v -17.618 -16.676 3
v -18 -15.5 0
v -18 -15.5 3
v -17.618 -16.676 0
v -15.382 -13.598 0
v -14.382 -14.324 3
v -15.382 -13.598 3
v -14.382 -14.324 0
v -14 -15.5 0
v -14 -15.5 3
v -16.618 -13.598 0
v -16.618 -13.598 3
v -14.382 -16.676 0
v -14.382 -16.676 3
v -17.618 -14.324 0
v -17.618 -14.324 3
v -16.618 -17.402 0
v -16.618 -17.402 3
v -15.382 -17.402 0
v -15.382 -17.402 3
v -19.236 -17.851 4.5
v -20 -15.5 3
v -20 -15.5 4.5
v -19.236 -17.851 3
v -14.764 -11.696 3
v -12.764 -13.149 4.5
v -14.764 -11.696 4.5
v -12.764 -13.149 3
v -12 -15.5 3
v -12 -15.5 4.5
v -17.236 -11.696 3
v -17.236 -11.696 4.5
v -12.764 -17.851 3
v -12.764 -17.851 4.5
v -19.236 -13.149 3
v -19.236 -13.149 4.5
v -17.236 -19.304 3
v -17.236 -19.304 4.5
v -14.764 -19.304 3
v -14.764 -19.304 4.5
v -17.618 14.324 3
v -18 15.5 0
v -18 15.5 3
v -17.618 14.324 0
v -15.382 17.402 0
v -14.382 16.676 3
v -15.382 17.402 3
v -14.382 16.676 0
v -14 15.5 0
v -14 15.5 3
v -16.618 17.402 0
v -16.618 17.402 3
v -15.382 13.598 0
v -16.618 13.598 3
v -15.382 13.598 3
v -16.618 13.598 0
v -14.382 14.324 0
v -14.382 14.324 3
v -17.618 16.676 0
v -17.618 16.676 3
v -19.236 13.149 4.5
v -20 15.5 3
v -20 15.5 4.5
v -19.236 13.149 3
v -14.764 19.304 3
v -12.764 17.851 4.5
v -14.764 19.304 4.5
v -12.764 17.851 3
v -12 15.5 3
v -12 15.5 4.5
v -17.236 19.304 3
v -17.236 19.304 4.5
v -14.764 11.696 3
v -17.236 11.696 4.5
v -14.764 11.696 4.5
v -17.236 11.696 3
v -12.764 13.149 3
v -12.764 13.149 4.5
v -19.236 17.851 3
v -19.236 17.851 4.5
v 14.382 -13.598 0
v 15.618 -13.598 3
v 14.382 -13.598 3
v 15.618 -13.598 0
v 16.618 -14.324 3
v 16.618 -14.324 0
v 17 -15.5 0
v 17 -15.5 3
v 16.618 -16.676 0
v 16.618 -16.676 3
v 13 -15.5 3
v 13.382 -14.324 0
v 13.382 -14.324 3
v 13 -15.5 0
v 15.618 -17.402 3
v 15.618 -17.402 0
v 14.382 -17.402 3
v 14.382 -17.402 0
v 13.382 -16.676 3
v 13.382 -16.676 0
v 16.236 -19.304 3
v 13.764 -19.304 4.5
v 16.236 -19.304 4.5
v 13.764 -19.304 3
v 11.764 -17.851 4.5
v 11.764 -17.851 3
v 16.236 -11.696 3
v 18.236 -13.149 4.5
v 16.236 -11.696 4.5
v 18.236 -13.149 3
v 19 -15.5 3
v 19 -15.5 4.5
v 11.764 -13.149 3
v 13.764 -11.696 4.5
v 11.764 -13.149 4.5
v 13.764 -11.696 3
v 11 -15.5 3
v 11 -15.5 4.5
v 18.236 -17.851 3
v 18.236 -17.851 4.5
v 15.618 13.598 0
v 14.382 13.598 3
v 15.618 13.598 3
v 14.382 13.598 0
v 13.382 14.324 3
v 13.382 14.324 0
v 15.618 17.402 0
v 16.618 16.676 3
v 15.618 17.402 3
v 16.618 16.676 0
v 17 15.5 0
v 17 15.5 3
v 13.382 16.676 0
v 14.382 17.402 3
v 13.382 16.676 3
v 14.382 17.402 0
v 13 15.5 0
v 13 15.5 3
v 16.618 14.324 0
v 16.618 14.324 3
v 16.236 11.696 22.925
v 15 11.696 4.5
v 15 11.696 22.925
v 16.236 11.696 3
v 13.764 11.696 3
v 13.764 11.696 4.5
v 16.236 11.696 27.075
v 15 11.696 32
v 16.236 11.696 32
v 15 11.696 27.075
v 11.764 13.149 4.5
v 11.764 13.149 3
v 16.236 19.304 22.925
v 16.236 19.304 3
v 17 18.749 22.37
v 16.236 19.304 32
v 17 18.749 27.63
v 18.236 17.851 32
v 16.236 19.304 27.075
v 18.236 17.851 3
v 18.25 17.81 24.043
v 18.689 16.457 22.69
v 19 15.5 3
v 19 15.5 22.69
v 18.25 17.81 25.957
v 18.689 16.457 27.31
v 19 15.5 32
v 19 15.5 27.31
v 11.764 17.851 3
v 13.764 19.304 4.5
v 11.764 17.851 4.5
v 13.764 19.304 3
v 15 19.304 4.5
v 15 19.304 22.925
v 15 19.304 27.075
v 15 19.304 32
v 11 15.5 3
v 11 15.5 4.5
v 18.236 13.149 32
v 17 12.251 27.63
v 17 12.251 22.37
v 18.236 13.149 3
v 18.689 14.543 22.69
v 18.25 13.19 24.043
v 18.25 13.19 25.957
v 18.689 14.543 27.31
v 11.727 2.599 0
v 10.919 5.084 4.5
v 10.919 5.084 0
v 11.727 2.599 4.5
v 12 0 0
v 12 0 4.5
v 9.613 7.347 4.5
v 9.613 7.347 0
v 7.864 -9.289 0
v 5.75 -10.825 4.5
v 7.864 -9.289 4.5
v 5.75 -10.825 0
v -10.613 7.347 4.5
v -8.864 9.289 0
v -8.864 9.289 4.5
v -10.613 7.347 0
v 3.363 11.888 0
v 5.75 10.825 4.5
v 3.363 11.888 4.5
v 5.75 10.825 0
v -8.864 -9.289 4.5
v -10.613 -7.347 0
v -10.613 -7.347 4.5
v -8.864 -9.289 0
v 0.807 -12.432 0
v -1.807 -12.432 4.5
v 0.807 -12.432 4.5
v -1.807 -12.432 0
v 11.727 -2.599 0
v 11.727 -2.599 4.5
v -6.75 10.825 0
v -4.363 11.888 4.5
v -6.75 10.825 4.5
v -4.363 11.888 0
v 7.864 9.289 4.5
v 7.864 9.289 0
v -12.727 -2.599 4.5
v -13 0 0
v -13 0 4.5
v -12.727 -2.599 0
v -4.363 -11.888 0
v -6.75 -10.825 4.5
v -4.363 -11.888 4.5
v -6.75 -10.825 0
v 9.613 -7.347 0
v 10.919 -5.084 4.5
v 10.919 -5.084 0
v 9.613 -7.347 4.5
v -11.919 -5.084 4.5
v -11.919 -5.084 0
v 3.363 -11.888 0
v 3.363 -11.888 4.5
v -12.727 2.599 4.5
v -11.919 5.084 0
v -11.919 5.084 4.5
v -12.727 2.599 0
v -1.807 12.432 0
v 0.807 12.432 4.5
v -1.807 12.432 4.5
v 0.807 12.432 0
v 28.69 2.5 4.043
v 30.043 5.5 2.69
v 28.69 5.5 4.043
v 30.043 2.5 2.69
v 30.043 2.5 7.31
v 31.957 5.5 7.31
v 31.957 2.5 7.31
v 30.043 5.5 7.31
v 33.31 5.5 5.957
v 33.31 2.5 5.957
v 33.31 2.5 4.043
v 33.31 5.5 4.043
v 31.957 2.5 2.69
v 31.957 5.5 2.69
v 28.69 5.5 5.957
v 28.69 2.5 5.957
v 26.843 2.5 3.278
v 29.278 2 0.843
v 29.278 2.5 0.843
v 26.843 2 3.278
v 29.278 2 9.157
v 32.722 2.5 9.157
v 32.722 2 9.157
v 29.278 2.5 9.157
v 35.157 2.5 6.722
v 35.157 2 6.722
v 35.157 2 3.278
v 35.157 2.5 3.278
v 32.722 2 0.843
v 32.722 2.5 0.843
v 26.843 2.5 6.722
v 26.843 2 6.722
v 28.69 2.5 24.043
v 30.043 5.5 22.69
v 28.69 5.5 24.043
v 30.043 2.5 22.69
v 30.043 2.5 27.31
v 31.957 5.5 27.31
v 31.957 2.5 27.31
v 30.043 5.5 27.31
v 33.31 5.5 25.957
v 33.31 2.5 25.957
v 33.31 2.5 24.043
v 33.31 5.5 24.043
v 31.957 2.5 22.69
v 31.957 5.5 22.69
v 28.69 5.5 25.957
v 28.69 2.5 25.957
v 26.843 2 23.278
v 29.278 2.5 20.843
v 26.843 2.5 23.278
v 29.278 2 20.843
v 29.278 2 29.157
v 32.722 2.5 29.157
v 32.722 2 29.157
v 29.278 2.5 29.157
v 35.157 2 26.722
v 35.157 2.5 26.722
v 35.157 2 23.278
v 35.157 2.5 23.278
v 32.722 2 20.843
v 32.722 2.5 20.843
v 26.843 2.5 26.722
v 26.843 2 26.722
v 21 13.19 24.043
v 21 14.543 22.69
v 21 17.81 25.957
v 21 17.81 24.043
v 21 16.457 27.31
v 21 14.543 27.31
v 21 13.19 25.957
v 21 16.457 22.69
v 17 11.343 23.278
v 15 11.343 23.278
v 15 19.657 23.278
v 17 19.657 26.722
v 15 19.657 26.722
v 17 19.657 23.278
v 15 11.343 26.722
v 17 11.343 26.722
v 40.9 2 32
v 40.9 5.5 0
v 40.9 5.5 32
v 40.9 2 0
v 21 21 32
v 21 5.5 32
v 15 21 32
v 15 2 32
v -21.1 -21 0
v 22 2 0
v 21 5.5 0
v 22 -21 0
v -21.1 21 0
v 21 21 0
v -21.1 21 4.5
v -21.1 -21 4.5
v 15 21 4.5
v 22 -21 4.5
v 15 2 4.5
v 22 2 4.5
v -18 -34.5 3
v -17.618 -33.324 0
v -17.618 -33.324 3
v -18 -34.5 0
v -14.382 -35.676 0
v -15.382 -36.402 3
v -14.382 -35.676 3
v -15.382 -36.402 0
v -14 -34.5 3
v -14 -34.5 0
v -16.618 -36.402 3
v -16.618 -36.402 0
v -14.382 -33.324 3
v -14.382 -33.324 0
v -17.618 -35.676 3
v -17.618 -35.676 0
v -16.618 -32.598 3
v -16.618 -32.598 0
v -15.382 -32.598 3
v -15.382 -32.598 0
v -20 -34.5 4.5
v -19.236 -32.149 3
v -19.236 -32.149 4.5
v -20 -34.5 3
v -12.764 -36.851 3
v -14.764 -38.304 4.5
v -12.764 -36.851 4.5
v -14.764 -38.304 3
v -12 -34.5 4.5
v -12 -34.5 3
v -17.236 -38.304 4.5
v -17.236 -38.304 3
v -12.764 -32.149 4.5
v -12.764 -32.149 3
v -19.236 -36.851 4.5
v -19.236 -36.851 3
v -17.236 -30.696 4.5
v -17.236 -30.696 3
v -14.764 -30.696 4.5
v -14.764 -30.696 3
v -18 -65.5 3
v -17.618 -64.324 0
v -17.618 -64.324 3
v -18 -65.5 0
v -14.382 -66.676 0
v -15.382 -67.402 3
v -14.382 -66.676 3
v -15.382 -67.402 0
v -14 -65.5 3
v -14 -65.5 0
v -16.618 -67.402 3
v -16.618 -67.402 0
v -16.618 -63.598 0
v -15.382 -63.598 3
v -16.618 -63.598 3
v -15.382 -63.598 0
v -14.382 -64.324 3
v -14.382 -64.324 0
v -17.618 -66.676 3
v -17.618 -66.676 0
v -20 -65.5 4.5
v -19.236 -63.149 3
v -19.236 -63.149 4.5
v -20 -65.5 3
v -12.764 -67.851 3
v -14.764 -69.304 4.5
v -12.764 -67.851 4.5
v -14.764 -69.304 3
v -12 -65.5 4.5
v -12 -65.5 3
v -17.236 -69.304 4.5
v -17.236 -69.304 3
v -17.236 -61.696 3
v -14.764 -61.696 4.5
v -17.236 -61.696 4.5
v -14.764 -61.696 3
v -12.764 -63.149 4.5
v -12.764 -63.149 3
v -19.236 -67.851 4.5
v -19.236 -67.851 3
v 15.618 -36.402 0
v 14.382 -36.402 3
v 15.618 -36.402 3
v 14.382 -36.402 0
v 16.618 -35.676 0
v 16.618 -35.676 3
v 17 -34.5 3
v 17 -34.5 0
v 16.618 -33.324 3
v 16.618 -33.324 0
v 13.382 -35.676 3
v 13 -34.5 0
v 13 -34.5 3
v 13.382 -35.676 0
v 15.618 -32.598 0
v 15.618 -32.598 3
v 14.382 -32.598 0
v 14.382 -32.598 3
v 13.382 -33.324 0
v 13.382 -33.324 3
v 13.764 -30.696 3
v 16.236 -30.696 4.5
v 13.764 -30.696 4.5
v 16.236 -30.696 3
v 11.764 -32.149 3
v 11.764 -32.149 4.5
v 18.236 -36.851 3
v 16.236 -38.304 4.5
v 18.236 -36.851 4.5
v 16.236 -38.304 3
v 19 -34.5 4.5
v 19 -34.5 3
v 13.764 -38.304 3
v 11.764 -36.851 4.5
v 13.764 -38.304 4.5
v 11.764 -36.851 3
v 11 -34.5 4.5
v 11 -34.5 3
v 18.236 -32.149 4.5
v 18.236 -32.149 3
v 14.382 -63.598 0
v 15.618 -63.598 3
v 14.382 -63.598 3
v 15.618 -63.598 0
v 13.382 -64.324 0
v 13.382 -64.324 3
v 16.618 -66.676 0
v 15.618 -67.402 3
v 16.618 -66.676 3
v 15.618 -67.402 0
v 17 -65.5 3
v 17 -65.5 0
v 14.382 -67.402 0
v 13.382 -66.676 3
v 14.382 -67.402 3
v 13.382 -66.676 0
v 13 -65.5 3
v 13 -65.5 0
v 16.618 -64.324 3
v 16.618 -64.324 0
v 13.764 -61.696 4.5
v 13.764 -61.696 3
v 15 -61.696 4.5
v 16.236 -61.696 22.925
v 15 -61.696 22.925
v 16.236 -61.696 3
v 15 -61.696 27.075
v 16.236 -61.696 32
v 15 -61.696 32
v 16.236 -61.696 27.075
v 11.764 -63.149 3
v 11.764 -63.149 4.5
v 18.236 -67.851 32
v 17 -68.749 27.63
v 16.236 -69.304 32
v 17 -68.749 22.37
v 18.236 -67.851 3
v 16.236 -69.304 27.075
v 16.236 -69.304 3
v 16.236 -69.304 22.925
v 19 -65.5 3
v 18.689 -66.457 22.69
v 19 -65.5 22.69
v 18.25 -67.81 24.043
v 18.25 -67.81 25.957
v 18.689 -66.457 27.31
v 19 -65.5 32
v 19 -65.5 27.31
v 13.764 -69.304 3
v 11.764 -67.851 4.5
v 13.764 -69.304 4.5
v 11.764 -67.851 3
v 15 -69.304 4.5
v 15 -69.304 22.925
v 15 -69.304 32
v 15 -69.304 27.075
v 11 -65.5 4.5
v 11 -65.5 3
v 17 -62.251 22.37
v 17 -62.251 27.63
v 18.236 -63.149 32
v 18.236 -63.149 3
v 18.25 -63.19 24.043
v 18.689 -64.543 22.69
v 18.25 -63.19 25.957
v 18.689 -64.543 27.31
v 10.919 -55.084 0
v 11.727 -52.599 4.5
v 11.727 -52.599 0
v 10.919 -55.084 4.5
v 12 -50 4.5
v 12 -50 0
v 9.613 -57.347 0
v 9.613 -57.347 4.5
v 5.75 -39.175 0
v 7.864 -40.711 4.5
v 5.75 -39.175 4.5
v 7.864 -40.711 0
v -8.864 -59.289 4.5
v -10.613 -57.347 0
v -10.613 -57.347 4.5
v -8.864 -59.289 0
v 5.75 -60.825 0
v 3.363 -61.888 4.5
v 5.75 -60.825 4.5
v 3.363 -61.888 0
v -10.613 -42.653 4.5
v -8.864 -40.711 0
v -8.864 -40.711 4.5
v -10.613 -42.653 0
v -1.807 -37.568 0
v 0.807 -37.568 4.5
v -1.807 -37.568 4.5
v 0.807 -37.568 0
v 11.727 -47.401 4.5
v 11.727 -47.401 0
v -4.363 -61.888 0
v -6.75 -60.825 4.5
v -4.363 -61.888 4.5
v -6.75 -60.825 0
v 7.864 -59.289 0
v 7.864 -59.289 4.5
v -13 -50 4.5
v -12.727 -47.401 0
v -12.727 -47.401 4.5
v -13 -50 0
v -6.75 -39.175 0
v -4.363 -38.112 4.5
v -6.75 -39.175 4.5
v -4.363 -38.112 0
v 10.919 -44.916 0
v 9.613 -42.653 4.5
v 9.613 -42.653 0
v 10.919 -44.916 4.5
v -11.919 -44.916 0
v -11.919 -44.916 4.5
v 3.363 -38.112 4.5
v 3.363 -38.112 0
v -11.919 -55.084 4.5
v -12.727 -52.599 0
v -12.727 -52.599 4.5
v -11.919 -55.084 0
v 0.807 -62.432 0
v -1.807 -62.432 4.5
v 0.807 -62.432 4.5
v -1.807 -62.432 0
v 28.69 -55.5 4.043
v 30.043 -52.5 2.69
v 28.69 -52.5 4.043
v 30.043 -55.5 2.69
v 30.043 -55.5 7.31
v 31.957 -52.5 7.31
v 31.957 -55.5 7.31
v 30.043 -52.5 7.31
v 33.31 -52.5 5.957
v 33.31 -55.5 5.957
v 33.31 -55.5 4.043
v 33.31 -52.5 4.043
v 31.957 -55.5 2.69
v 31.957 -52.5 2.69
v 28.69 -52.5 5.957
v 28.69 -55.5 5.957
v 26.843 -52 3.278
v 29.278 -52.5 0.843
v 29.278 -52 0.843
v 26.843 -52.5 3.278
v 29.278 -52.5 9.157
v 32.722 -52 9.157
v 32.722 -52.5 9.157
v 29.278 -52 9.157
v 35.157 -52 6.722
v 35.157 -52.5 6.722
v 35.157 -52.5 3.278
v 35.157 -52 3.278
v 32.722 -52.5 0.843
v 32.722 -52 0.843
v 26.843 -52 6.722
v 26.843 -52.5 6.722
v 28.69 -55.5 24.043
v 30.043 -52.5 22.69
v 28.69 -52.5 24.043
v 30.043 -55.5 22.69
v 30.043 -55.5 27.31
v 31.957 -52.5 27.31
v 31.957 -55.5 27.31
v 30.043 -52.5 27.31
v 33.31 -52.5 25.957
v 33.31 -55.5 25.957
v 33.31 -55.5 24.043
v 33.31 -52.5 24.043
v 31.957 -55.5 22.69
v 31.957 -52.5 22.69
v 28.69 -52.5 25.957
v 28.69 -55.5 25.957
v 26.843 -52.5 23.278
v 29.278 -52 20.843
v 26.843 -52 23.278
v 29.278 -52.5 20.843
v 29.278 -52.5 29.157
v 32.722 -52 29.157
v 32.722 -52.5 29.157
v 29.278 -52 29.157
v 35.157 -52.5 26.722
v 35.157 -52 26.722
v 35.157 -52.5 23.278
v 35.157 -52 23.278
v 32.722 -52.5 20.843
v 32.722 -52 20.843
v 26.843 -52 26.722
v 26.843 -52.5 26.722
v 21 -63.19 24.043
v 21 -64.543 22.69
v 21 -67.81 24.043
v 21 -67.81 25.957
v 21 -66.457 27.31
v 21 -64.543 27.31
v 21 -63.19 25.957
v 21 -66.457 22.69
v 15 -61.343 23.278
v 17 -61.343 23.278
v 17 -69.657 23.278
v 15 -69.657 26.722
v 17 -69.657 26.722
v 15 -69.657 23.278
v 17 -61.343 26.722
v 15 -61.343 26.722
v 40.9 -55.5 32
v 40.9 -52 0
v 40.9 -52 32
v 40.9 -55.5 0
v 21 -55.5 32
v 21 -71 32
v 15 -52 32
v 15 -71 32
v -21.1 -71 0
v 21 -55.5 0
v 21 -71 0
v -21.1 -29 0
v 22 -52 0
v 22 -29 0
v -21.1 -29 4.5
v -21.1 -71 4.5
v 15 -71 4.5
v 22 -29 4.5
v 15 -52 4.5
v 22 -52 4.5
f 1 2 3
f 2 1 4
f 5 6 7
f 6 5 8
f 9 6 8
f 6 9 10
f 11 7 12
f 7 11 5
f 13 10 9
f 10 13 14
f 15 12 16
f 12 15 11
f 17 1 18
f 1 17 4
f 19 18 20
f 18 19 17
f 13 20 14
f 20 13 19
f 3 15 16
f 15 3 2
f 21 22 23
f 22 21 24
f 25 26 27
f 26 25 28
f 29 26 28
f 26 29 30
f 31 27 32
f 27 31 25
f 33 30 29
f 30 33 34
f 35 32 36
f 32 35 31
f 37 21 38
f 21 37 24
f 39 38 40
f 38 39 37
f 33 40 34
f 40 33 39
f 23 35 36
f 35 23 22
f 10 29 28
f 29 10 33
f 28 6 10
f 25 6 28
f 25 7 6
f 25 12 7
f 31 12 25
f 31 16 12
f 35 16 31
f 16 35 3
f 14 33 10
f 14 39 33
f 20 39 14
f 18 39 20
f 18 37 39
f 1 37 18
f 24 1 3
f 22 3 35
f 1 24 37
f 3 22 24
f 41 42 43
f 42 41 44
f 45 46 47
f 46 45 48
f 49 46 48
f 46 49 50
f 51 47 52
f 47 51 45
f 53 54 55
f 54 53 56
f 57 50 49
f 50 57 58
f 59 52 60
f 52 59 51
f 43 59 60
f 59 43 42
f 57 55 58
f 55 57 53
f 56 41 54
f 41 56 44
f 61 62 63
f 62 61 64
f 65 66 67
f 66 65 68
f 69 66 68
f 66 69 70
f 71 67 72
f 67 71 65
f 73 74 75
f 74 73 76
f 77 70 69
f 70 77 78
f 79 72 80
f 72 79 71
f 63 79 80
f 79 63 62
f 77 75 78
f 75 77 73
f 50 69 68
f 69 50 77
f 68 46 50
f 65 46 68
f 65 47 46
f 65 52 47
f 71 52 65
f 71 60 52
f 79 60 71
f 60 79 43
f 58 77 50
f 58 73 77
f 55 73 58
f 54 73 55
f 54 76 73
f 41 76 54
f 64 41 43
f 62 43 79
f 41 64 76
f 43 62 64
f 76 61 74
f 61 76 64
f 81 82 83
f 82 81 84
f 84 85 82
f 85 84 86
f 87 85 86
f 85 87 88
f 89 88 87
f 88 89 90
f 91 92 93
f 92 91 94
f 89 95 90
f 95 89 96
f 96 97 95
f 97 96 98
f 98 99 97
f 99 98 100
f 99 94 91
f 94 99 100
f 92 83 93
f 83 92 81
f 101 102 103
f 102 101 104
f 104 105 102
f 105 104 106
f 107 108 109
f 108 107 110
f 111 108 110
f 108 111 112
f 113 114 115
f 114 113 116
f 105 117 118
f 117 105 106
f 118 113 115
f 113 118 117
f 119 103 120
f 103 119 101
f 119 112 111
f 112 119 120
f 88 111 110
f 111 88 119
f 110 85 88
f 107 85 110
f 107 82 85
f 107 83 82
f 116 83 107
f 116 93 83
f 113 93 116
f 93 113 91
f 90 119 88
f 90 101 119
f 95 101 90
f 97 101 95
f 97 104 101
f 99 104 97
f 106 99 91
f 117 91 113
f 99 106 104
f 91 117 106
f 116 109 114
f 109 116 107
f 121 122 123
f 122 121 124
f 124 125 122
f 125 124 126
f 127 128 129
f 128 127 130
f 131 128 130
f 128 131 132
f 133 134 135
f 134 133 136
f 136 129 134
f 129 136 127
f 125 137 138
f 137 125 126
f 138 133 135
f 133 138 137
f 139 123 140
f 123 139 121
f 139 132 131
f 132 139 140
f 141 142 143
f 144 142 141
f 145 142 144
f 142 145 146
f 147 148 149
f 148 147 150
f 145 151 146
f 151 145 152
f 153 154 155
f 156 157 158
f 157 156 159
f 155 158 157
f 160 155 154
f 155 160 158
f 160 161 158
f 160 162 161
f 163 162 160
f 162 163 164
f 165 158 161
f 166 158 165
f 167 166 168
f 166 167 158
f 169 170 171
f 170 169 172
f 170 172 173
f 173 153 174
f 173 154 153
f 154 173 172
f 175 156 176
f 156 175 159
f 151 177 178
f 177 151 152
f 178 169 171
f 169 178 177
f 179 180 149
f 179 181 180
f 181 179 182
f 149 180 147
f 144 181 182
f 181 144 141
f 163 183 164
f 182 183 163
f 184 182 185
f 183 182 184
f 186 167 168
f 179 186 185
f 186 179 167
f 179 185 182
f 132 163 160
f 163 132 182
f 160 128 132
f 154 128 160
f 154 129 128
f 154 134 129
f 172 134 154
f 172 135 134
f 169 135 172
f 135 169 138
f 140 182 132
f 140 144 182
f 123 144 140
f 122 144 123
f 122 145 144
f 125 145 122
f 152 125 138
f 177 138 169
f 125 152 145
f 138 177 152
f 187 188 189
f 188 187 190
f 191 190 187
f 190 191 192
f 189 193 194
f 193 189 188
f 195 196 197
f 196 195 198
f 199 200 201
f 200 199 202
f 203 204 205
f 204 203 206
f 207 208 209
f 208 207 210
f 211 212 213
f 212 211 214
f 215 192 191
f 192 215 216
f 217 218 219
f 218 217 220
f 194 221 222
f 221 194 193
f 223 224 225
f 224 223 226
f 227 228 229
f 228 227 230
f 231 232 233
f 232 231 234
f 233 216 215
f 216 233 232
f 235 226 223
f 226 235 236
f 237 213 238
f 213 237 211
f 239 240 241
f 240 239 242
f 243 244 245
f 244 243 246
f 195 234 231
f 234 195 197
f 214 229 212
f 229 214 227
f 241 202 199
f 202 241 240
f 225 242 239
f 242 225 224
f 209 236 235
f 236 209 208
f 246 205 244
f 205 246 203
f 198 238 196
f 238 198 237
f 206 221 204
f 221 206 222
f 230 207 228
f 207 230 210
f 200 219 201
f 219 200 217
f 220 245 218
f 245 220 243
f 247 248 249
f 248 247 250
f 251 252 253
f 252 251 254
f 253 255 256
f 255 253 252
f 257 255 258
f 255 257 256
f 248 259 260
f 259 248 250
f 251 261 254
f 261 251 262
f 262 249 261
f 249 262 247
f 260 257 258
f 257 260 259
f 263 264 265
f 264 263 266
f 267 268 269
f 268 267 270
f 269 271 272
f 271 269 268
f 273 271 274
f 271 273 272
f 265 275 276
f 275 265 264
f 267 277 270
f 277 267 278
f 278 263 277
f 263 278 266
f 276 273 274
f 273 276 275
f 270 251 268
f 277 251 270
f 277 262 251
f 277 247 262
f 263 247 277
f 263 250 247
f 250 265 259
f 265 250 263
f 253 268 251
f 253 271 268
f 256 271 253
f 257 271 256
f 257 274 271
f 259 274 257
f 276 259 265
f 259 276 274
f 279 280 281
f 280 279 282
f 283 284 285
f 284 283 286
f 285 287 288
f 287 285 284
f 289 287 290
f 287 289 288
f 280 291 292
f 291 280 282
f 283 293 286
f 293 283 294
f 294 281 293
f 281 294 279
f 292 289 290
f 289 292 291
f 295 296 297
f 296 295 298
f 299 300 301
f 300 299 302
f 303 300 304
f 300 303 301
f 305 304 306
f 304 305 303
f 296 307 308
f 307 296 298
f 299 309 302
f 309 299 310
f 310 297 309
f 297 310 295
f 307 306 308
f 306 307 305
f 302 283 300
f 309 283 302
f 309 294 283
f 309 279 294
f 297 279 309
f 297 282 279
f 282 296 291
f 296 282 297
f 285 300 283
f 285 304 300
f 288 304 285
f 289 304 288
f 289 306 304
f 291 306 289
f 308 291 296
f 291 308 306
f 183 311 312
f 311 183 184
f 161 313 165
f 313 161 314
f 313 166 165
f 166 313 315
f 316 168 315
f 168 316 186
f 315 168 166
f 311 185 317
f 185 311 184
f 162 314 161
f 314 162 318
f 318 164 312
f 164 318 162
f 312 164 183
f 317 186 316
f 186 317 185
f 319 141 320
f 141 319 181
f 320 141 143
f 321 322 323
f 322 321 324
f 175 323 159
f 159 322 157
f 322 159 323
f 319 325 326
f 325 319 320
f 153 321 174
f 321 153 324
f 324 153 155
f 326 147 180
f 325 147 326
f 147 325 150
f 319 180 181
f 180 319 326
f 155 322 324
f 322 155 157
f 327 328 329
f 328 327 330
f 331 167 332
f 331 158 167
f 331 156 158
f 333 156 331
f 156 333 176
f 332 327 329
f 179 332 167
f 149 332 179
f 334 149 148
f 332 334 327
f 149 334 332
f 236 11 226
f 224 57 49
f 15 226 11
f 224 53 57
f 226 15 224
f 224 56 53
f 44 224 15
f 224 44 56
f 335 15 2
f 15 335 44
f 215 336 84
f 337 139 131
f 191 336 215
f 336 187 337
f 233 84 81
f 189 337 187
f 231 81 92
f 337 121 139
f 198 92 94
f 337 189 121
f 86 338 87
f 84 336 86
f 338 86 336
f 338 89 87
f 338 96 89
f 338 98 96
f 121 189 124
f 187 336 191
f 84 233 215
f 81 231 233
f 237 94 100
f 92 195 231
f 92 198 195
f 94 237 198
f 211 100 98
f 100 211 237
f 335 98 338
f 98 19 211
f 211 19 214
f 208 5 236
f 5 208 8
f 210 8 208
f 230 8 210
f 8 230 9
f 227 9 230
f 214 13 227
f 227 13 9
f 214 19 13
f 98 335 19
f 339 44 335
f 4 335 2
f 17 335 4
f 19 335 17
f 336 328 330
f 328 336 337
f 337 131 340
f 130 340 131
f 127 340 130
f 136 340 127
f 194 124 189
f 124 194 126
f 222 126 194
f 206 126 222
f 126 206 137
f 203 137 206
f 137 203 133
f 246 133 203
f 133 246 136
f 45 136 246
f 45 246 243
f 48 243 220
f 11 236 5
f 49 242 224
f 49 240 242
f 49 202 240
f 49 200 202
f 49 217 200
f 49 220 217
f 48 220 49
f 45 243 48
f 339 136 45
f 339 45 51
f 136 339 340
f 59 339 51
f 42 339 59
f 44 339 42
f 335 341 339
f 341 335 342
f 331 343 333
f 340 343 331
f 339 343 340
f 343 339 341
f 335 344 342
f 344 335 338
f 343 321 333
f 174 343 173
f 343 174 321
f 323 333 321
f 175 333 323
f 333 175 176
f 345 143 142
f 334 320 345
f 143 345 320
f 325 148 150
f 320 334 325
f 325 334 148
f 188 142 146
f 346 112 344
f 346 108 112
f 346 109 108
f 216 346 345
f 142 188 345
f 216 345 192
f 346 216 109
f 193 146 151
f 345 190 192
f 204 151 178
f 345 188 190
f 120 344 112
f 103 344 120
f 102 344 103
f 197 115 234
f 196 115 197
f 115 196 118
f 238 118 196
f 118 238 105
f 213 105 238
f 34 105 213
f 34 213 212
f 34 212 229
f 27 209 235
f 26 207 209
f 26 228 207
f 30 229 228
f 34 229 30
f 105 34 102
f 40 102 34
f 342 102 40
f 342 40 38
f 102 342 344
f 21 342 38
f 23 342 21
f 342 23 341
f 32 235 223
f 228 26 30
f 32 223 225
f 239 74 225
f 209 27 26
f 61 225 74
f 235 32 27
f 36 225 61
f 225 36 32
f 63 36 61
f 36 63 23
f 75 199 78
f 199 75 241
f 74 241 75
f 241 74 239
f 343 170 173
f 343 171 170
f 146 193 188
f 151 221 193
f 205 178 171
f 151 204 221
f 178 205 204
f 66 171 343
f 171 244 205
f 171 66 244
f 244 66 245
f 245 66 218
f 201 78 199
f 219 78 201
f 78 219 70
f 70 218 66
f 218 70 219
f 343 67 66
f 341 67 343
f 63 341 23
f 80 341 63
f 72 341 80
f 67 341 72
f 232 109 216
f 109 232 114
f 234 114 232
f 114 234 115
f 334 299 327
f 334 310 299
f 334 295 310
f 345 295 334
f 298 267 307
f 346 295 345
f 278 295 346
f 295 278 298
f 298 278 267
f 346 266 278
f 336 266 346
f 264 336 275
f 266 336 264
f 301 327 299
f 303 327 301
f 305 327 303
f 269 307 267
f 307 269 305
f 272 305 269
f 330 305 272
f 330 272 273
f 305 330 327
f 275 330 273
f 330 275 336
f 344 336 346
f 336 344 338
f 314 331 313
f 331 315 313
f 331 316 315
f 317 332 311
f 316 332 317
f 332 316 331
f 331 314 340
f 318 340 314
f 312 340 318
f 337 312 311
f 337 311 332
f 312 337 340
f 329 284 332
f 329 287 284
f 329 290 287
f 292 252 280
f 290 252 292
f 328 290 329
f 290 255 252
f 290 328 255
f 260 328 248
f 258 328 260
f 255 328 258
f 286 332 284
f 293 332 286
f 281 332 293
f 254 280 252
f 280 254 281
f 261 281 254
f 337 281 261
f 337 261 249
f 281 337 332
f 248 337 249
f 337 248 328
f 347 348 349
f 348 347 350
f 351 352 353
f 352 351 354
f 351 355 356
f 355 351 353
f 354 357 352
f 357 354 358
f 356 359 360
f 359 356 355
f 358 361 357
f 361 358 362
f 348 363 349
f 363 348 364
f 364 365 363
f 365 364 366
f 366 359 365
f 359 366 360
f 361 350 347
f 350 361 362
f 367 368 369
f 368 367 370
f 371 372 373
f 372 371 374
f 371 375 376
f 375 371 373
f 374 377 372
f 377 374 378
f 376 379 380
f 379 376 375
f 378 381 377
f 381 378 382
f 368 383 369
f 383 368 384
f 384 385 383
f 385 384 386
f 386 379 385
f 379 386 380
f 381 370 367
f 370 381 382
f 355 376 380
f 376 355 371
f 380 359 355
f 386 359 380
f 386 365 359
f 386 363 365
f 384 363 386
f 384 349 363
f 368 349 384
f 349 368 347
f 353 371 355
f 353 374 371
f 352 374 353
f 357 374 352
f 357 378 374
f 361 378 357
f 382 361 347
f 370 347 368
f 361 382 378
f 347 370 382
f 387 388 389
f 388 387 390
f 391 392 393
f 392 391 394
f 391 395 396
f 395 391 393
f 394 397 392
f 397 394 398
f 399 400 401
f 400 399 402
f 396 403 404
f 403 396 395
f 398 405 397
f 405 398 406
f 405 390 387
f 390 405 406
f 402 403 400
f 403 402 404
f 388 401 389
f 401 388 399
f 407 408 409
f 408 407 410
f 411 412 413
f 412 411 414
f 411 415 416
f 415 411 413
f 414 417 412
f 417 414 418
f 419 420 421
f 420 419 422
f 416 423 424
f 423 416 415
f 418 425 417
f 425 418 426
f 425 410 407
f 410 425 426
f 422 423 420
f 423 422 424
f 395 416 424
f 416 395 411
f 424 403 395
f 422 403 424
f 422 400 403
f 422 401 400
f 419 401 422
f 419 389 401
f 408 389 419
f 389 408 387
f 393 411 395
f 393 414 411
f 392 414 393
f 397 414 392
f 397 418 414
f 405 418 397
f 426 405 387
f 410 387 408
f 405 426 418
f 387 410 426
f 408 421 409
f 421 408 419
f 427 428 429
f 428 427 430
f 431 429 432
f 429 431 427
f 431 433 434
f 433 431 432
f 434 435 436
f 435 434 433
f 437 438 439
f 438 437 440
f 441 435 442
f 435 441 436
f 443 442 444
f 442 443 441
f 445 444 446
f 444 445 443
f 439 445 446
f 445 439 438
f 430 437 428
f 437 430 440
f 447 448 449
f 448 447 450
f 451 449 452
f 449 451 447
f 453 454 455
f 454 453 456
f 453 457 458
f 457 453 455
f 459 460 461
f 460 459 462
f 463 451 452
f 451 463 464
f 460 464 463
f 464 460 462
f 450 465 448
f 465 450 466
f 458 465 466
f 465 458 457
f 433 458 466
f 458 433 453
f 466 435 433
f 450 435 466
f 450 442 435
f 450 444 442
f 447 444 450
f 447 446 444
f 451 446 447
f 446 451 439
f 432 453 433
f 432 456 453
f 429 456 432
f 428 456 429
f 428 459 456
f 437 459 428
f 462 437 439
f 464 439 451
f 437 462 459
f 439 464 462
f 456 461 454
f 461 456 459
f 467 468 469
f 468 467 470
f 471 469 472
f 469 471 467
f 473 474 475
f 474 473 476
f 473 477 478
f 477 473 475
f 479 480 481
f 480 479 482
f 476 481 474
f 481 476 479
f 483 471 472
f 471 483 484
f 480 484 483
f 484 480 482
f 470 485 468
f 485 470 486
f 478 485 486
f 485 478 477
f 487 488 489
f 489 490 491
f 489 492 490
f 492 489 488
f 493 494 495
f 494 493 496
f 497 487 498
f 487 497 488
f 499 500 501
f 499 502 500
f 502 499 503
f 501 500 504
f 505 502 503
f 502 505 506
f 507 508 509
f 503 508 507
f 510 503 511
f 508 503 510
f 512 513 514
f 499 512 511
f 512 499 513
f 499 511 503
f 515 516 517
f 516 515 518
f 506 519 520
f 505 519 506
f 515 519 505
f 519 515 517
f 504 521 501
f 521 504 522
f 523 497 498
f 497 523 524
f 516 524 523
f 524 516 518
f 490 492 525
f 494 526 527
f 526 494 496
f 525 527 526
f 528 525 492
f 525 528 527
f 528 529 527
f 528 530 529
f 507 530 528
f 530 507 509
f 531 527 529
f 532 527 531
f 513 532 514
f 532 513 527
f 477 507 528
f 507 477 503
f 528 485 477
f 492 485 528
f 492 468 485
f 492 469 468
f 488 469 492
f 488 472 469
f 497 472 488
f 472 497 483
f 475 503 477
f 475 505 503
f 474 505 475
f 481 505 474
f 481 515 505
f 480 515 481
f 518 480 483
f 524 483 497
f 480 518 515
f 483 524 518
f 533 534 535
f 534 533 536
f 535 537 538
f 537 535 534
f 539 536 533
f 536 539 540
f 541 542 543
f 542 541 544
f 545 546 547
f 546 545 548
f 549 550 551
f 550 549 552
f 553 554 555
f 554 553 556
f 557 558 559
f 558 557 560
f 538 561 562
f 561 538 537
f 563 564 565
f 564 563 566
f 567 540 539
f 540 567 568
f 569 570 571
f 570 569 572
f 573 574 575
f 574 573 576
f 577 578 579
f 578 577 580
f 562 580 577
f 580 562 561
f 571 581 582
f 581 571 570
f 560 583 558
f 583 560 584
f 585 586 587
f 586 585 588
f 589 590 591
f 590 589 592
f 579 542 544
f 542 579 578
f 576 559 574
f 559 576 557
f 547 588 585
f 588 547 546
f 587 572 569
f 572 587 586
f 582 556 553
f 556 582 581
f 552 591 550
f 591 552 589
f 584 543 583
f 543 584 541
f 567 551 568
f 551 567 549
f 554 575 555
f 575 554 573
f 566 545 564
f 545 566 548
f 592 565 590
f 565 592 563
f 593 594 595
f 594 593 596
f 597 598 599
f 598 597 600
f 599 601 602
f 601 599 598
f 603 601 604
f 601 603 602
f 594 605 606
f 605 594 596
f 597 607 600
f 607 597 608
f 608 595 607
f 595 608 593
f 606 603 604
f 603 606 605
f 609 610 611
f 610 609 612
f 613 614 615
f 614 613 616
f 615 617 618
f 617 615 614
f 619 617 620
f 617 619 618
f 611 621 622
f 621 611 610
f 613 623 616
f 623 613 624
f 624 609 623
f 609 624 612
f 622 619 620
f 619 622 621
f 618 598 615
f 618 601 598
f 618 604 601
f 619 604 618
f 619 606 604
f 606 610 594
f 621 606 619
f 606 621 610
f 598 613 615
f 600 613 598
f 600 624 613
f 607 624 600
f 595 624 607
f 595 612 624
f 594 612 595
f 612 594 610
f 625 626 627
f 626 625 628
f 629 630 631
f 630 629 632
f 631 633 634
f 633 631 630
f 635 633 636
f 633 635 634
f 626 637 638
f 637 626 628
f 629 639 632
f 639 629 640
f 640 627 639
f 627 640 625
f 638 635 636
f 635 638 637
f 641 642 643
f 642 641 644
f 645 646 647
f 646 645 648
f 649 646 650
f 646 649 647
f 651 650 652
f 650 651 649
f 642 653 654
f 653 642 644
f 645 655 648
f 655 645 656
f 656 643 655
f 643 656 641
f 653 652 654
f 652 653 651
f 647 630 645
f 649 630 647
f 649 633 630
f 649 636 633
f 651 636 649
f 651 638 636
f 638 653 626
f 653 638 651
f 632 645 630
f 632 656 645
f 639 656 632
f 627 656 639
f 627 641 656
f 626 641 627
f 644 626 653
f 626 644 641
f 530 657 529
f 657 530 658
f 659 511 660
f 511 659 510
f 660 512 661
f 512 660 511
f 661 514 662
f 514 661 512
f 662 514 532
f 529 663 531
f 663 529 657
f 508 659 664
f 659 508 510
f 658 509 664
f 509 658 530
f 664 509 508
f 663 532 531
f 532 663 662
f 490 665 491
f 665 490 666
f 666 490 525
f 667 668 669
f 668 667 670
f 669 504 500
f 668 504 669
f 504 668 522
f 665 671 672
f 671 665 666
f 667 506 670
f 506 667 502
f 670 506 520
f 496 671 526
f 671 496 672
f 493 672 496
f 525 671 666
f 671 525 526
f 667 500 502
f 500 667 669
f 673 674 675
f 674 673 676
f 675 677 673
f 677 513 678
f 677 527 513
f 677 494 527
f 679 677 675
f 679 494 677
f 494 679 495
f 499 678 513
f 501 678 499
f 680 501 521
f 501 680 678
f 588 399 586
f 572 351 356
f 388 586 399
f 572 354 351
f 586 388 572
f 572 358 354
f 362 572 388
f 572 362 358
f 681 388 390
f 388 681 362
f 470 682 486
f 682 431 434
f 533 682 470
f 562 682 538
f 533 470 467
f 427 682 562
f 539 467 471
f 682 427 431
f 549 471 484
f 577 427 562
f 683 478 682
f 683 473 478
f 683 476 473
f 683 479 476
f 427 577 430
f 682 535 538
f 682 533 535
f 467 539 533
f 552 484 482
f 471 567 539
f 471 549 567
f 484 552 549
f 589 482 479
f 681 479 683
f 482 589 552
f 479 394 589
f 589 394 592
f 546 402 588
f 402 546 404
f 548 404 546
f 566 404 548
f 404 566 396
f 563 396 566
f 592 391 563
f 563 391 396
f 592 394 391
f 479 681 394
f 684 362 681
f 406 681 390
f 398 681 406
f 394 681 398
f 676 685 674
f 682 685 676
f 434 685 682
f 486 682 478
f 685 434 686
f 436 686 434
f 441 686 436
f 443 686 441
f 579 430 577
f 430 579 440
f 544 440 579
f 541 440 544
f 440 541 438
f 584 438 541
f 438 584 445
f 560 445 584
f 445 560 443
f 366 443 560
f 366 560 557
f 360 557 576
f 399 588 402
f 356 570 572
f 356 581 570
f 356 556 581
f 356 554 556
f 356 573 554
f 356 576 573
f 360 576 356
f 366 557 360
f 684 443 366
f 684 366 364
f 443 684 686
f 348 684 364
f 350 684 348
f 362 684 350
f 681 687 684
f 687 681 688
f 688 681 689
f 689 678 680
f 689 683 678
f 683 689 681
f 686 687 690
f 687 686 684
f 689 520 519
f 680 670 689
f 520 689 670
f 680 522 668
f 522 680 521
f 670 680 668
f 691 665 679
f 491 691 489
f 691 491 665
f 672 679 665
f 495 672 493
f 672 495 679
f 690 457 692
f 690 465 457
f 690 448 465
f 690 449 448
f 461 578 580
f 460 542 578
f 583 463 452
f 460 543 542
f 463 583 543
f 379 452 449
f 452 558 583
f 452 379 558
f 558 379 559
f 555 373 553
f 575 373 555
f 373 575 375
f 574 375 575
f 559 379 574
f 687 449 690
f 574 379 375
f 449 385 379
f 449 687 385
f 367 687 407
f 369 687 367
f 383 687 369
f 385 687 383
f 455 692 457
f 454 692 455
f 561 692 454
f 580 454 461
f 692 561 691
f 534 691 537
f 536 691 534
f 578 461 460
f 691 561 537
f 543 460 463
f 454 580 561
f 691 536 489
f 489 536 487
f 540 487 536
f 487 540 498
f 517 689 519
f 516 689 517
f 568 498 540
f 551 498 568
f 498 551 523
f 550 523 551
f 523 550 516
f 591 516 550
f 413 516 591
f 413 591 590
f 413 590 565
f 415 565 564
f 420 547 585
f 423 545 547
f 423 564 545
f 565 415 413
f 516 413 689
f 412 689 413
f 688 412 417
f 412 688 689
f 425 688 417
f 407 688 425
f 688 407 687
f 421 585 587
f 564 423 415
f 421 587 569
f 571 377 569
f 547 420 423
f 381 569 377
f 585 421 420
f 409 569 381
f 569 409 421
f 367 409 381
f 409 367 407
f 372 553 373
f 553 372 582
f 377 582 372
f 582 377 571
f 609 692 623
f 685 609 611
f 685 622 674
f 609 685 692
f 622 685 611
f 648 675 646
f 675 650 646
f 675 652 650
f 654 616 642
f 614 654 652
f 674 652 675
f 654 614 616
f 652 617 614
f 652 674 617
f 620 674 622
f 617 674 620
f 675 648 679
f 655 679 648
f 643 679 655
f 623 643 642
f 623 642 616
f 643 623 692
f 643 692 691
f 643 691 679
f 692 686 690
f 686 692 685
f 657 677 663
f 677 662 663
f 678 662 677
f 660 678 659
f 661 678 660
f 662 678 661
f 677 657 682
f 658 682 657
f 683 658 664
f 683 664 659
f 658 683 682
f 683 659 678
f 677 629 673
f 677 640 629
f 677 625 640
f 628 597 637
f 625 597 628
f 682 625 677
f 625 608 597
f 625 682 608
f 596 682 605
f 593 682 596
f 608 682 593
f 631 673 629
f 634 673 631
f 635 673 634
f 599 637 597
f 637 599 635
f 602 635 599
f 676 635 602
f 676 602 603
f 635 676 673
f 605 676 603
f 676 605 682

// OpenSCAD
// file: extrusions.scad
module Islot5(l=100){
translate([l/2,0,0]){cube([l,5,6.6],center=true);
translate([0,0,1])hull(){
cube([l,5,4.5],center=true);
translate([0,0,-1.5])cube([l,11,1.5],center=true);
}
}
}

module rcorner(r,l){
translate([l/2,0,0])difference(){
cube([l,r*2,r*2],center=true);
for(i=[-1,1])for(j=[-1,1])translate([0,i*r,j*r])rotate([0,90,0])cylinder(r=r,h=l+1,$fn=20,center=true);
}
}


module profilex020(l=100,x=4){
xwidth=x*10;
color("beige")difference(){
translate([0,-xwidth,-10])cube([l,2*xwidth,20]);
if(x>1)for(i=[1:x-1])translate([-.5,-xwidth+i*20,0])rotate([0,90,0])cylinder(r=12.5/2,$fn=20,h=l+1);

for(i=[0:x-1])translate([-.5,-xwidth+10+i*20,0]){
rotate([0,90,0])cylinder(r=4.3/2,$fn=20,h=l+1);
translate([0,0,-6.9])Islot5(l+1);
mirror([0,0,1])translate([0,0,-6.9])Islot5(l+1);
}
for(i=[0,1])mirror([0,i,0])translate([-.5,-xwidth+3.1,0])rotate([-90,0,0])Islot5(l+1);
for(i=[-xwidth,xwidth])for(j=[-10,10])translate([-.5,i,j])rcorner(2,l+1);
}
}

module profile8020(l=100){
echo(str("profile 8020 L:",l,"mm weight:",(l*.00189),"kg"));
profilex020(l=l,x=4);
}
module profile4020(l=100){
echo(str("profile 4020 L:",l,"mm weight:",(l*.00089),"kg"));
profilex020(l=l,x=2);
}
module profile6020(l=100){
echo(str("profile 6020 L:",l,"mm weight:",(l*.00128),"kg"));
profilex020(l=l,x=3);
}
module profile2020(l=100){
echo(str("profile 2020 L:",l,"mm weight:",(l*.00049),"kg"));
profilex020(l=l,x=1);
}


module drylinn80(len=100,pos=0){
echo(str("drylin NS-01-80 L:",len,"mm weight:",(len*.00114+0.1),"kg"));
xpos=max(0,min(pos,len-80));
color("gray")difference(){
translate([0,-40,0])cube([len,80,12]);
for(i=[0:round(len/150)]){
translate([25+150*i,0,-1]){
	translate([0,20,0])cylinder(r=2,$fn=20,h=30);
	translate([0,-20,0])cylinder(r=2,$fn=20,h=30);
	translate([0,20,4.5])cylinder(r=4,$fn=20,h=30);
	translate([0,-20,4.5])cylinder(r=4,$fn=20,h=30);
	
}
}
translate([-.5,-57/2,6.5])cube([len+1,57,6]);
}
color("beige")difference(){union(){
translate([xpos,-56/2,6.1])cube([80,56,3]);
translate([xpos+6,-56/2,5.9])cube([68,56,6.1]);
}for(i=[0,56])for(j=[-22.5,22.5])translate([xpos+12+i,j,0])cylinder(r=2,$fn=20,h=15);
}

}


module drylinn27(len=80,pos=0){
//echo(str("drylin NS-01-80 L:",len,"mm weight:",(len*.00114+0.1),"kg"));
xpos=max(0,min(pos,len-20));
color("gray")difference(){
translate([0,-27/2,0])cube([len,27,9]);
translate([-.5,-27/2-.1,-.1])cube([len+1,2.76,3.3]);
translate([-.5,27/2-2.75,-.1])cube([len+1,2.76,3.3]);
for(i=[0:round(len/150)]){
translate([25+150*i,0,-1]){
	translate([0,20,0])cylinder(r=2,$fn=20,h=30);
	translate([0,-20,0])cylinder(r=2,$fn=20,h=30);
	translate([0,20,4.5])cylinder(r=4,$fn=20,h=30);
	translate([0,-20,4.5])cylinder(r=4,$fn=20,h=30);
	
}
}
translate([-.5,-16/2,6.5])cube([len+1,16,6]);
}
color("beige")difference(){union(){
translate([xpos,-16/2,6.1])cube([34,16,3]);
translate([xpos+2,-16/2+1,6.6])cube([30,14,3]);
for(i=[0,20])translate([xpos+7	+i,0,9])cylinder(r=3.2,$fn=20,h=5.5);
}
for(i=[0,20])translate([xpos+7	+i,0,2])cylinder(r=2,$fn=20,h=15.5);
}
}


drylinn27(80);

module nema17(cutout=true){
difference(){union(){translate([0,0,-48/2])cube([42,42,48],true);
translate([0,0,-1])cylinder(r=11,h=3.5);

translate([0,0,-1])cylinder(r=2.5,h=25,$fn=30);
if(cutout==true){
translate([0,0,-1])cylinder(r=12.5,h=25);
for(i=[-31/2,31/2])for(j=[-31/2,31/2]){
translate([i,j,-1])cylinder(r=2,h=12,$fn=10);
translate([i,j,10])cylinder(r=4,h=31,$fn=10);
}
}
}
if(cutout!=true){for(i=[-31/2,31/2])for(j=[-31/2,31/2]){
translate([i,j,-4])cylinder(r=2,h=11,$fn=10);
}
}
}
}


module hsnema8(cutout=true){
difference(){
union(){
translate([0,0,30.1/2])cube([20,20,30.1],center=true);
translate([0,0,30.0])cylinder(r=7.5,h=1.4);
translate([0,0,-7])cylinder(r=2.5,h=7.1,$fn=30);
translate([0,0,30.0])cylinder(r=2.5,h=7.1,$fn=30);
if(cutout==true){
translate([0,0,30.0])cylinder(r=7.7,h=11.4);
translate([0,0,-10.0])cylinder(r=7.7,h=11.4);
for(i=[-15.7/2,15.7/2])for(j=[-15.7/2,15.7/2])translate([i,j,28.2+1]){
cylinder(r=2.5/2,h=10.1,$fn=10);
translate([0,0,8])cylinder(r=5/2,h=10,$fn=10);
}
}

}
for(i=[-15.7/2,15.7/2])for(j=[-15.7/2,15.7/2])translate([i,j,28.2])if(cutout!=true){
cylinder(r=2.5/2,h=2,$fn=10);
}
if(cutout!=true){
cylinder(r=2.5/2,h=80,center=true,$fn=20);
}
}
}

hsnema8();

module nema14(cutout=true){
difference(){union(){translate([0,0,-36/2])cube([35,35,36],true);
translate([0,0,-1])cylinder(r=11,h=3.5);

translate([0,0,-1])cylinder(r=2.5,h=25,$fn=30);
if(cutout==true){
translate([0,0,-1])cylinder(r=11.5,h=25);
for(i=[-26/2,26/2])for(j=[-26/2,26/2]){
translate([i,j,-1])cylinder(r=2,h=12,$fn=10);
translate([i,j,10])cylinder(r=4,h=31,$fn=10);
}
}
}
if(cutout!=true){for(i=[-26/2,26/2])for(j=[-26/2,26/2]){
translate([i,j,-4])cylinder(r=2,h=11,$fn=10);
}
}
}
}
// main file
use <extrusions.scad>

%translate([31,11+4.5,40])rotate([0,90,0])profile2020();
%translate([31,111+4.5,40])rotate([0,90,0])profile2020();

module xidlerblock(){
translate([-20,0,0])mirror([0,1,0])rotate([0,0,-90])difference(){
translate([0,3,0])cube([12,37,21],true);
translate([0,-14.5+17,0])cube([16,18,11],true);
*translate([-10,-21.5,0])rotate([0,0,35])cube([16,18,11],true);
for(i=[-14.5+17,20-2.5])translate([0,i,0]){translate([0,0,0])rotate([0,0,22.5])cylinder(r=2.5,h=22,center=true,$fn=8);
translate([0,0,9.6])rotate([0,0,22.5])cylinder(r=4.5,h=4,center=true,$fn=8);
}
#translate([1.5,-8,0])rotate([0,-90,0]){
translate([0,-2.5,-10])rotate([0,0,22.5])cylinder(r=2.5,h=40,center=true,$fn=8);
translate([0,-2.5,7.6])rotate([0,0,0])cylinder(r=8.3/2,h=4,center=true,$fn=6);
}

}

}



module xidler(){
%translate([33.5,-8,16])rotate([0,0,20])xidlerblock();
%translate([33.5,-8,16])rotate([0,0,-3])xidlerblock();
difference(){
translate([-11.1,-21,0])cube([52,42,32]);
translate([31,11+4.5,40])rotate([0,90,0])cube([100,20,20],true);
translate([-15,-42,5])cube([60,44,40]);
translate([-35,-42,-5])cube([60,44,40]);
translate([-34,6,-5.5])cube([50,44,40]);
translate([-34,1,22.5])cube([50,44,40]);
translate([-4.5,1,13.5])cube([18,10,5]);



#translate([31,-8,8])rotate([0,0,0])rotate([0,0,360/16]){cylinder(r=2.5,h=30,center=true,$fn=8);
*cylinder(r=4.5,h=30,$fn=8);
}
for(i=[0,20])translate([17,11+4.5,26-i])rotate([0,-90,0])rotate([0,0,360/16]){cylinder(r=2.5,h=30,center=true,$fn=8);
cylinder(r=4.5,h=30,$fn=8);
}
}
}



module xmotormount(){difference(){
translate([-21.1,-21,0])cube([62,42,32]);
translate([-35,-22,4.5])cube([50,44,40]);
translate([-5,-42,4.5])cube([50,44,40]);
translate([22,-42,-5.5])cube([50,44,40]);
translate([31,11+4.5,40])rotate([0,90,0])cube([100,20,20],true);

translate([-0.5,0,-7])nema17();

translate([31,2.5,5])rotate([90,0,0])rotate([0,0,360/16]){cylinder(r=2.5,h=30,center=true,$fn=8);
cylinder(r=4.5,h=30,$fn=8);
}
translate([31,2.5,25])rotate([90,0,0])rotate([0,0,360/16]){cylinder(r=2.5,h=30,center=true,$fn=8);
cylinder(r=4.5,h=30,$fn=8);
}
translate([17,11+4.5,25])rotate([0,-90,0])rotate([0,0,360/16]){cylinder(r=2.5,h=30,center=true,$fn=8);
cylinder(r=4.5,h=30,$fn=8);
}
}
}
//idlers
*translate(100,0,0){
translate([0,100,0])xidler();
translate([10.5,85.5,6])rotate([-90,0,0])xidlerblock();

translate([0,50,0])mirror([1,0,0]){
translate([0,100,0])xidler();
translate([10.5,85.5,6])rotate([-90,0,0])xidlerblock();
}
}

//motors
translate(){
xmotormount();
translate([0,-50,0])mirror([0,1,0]) xmotormount();
}
